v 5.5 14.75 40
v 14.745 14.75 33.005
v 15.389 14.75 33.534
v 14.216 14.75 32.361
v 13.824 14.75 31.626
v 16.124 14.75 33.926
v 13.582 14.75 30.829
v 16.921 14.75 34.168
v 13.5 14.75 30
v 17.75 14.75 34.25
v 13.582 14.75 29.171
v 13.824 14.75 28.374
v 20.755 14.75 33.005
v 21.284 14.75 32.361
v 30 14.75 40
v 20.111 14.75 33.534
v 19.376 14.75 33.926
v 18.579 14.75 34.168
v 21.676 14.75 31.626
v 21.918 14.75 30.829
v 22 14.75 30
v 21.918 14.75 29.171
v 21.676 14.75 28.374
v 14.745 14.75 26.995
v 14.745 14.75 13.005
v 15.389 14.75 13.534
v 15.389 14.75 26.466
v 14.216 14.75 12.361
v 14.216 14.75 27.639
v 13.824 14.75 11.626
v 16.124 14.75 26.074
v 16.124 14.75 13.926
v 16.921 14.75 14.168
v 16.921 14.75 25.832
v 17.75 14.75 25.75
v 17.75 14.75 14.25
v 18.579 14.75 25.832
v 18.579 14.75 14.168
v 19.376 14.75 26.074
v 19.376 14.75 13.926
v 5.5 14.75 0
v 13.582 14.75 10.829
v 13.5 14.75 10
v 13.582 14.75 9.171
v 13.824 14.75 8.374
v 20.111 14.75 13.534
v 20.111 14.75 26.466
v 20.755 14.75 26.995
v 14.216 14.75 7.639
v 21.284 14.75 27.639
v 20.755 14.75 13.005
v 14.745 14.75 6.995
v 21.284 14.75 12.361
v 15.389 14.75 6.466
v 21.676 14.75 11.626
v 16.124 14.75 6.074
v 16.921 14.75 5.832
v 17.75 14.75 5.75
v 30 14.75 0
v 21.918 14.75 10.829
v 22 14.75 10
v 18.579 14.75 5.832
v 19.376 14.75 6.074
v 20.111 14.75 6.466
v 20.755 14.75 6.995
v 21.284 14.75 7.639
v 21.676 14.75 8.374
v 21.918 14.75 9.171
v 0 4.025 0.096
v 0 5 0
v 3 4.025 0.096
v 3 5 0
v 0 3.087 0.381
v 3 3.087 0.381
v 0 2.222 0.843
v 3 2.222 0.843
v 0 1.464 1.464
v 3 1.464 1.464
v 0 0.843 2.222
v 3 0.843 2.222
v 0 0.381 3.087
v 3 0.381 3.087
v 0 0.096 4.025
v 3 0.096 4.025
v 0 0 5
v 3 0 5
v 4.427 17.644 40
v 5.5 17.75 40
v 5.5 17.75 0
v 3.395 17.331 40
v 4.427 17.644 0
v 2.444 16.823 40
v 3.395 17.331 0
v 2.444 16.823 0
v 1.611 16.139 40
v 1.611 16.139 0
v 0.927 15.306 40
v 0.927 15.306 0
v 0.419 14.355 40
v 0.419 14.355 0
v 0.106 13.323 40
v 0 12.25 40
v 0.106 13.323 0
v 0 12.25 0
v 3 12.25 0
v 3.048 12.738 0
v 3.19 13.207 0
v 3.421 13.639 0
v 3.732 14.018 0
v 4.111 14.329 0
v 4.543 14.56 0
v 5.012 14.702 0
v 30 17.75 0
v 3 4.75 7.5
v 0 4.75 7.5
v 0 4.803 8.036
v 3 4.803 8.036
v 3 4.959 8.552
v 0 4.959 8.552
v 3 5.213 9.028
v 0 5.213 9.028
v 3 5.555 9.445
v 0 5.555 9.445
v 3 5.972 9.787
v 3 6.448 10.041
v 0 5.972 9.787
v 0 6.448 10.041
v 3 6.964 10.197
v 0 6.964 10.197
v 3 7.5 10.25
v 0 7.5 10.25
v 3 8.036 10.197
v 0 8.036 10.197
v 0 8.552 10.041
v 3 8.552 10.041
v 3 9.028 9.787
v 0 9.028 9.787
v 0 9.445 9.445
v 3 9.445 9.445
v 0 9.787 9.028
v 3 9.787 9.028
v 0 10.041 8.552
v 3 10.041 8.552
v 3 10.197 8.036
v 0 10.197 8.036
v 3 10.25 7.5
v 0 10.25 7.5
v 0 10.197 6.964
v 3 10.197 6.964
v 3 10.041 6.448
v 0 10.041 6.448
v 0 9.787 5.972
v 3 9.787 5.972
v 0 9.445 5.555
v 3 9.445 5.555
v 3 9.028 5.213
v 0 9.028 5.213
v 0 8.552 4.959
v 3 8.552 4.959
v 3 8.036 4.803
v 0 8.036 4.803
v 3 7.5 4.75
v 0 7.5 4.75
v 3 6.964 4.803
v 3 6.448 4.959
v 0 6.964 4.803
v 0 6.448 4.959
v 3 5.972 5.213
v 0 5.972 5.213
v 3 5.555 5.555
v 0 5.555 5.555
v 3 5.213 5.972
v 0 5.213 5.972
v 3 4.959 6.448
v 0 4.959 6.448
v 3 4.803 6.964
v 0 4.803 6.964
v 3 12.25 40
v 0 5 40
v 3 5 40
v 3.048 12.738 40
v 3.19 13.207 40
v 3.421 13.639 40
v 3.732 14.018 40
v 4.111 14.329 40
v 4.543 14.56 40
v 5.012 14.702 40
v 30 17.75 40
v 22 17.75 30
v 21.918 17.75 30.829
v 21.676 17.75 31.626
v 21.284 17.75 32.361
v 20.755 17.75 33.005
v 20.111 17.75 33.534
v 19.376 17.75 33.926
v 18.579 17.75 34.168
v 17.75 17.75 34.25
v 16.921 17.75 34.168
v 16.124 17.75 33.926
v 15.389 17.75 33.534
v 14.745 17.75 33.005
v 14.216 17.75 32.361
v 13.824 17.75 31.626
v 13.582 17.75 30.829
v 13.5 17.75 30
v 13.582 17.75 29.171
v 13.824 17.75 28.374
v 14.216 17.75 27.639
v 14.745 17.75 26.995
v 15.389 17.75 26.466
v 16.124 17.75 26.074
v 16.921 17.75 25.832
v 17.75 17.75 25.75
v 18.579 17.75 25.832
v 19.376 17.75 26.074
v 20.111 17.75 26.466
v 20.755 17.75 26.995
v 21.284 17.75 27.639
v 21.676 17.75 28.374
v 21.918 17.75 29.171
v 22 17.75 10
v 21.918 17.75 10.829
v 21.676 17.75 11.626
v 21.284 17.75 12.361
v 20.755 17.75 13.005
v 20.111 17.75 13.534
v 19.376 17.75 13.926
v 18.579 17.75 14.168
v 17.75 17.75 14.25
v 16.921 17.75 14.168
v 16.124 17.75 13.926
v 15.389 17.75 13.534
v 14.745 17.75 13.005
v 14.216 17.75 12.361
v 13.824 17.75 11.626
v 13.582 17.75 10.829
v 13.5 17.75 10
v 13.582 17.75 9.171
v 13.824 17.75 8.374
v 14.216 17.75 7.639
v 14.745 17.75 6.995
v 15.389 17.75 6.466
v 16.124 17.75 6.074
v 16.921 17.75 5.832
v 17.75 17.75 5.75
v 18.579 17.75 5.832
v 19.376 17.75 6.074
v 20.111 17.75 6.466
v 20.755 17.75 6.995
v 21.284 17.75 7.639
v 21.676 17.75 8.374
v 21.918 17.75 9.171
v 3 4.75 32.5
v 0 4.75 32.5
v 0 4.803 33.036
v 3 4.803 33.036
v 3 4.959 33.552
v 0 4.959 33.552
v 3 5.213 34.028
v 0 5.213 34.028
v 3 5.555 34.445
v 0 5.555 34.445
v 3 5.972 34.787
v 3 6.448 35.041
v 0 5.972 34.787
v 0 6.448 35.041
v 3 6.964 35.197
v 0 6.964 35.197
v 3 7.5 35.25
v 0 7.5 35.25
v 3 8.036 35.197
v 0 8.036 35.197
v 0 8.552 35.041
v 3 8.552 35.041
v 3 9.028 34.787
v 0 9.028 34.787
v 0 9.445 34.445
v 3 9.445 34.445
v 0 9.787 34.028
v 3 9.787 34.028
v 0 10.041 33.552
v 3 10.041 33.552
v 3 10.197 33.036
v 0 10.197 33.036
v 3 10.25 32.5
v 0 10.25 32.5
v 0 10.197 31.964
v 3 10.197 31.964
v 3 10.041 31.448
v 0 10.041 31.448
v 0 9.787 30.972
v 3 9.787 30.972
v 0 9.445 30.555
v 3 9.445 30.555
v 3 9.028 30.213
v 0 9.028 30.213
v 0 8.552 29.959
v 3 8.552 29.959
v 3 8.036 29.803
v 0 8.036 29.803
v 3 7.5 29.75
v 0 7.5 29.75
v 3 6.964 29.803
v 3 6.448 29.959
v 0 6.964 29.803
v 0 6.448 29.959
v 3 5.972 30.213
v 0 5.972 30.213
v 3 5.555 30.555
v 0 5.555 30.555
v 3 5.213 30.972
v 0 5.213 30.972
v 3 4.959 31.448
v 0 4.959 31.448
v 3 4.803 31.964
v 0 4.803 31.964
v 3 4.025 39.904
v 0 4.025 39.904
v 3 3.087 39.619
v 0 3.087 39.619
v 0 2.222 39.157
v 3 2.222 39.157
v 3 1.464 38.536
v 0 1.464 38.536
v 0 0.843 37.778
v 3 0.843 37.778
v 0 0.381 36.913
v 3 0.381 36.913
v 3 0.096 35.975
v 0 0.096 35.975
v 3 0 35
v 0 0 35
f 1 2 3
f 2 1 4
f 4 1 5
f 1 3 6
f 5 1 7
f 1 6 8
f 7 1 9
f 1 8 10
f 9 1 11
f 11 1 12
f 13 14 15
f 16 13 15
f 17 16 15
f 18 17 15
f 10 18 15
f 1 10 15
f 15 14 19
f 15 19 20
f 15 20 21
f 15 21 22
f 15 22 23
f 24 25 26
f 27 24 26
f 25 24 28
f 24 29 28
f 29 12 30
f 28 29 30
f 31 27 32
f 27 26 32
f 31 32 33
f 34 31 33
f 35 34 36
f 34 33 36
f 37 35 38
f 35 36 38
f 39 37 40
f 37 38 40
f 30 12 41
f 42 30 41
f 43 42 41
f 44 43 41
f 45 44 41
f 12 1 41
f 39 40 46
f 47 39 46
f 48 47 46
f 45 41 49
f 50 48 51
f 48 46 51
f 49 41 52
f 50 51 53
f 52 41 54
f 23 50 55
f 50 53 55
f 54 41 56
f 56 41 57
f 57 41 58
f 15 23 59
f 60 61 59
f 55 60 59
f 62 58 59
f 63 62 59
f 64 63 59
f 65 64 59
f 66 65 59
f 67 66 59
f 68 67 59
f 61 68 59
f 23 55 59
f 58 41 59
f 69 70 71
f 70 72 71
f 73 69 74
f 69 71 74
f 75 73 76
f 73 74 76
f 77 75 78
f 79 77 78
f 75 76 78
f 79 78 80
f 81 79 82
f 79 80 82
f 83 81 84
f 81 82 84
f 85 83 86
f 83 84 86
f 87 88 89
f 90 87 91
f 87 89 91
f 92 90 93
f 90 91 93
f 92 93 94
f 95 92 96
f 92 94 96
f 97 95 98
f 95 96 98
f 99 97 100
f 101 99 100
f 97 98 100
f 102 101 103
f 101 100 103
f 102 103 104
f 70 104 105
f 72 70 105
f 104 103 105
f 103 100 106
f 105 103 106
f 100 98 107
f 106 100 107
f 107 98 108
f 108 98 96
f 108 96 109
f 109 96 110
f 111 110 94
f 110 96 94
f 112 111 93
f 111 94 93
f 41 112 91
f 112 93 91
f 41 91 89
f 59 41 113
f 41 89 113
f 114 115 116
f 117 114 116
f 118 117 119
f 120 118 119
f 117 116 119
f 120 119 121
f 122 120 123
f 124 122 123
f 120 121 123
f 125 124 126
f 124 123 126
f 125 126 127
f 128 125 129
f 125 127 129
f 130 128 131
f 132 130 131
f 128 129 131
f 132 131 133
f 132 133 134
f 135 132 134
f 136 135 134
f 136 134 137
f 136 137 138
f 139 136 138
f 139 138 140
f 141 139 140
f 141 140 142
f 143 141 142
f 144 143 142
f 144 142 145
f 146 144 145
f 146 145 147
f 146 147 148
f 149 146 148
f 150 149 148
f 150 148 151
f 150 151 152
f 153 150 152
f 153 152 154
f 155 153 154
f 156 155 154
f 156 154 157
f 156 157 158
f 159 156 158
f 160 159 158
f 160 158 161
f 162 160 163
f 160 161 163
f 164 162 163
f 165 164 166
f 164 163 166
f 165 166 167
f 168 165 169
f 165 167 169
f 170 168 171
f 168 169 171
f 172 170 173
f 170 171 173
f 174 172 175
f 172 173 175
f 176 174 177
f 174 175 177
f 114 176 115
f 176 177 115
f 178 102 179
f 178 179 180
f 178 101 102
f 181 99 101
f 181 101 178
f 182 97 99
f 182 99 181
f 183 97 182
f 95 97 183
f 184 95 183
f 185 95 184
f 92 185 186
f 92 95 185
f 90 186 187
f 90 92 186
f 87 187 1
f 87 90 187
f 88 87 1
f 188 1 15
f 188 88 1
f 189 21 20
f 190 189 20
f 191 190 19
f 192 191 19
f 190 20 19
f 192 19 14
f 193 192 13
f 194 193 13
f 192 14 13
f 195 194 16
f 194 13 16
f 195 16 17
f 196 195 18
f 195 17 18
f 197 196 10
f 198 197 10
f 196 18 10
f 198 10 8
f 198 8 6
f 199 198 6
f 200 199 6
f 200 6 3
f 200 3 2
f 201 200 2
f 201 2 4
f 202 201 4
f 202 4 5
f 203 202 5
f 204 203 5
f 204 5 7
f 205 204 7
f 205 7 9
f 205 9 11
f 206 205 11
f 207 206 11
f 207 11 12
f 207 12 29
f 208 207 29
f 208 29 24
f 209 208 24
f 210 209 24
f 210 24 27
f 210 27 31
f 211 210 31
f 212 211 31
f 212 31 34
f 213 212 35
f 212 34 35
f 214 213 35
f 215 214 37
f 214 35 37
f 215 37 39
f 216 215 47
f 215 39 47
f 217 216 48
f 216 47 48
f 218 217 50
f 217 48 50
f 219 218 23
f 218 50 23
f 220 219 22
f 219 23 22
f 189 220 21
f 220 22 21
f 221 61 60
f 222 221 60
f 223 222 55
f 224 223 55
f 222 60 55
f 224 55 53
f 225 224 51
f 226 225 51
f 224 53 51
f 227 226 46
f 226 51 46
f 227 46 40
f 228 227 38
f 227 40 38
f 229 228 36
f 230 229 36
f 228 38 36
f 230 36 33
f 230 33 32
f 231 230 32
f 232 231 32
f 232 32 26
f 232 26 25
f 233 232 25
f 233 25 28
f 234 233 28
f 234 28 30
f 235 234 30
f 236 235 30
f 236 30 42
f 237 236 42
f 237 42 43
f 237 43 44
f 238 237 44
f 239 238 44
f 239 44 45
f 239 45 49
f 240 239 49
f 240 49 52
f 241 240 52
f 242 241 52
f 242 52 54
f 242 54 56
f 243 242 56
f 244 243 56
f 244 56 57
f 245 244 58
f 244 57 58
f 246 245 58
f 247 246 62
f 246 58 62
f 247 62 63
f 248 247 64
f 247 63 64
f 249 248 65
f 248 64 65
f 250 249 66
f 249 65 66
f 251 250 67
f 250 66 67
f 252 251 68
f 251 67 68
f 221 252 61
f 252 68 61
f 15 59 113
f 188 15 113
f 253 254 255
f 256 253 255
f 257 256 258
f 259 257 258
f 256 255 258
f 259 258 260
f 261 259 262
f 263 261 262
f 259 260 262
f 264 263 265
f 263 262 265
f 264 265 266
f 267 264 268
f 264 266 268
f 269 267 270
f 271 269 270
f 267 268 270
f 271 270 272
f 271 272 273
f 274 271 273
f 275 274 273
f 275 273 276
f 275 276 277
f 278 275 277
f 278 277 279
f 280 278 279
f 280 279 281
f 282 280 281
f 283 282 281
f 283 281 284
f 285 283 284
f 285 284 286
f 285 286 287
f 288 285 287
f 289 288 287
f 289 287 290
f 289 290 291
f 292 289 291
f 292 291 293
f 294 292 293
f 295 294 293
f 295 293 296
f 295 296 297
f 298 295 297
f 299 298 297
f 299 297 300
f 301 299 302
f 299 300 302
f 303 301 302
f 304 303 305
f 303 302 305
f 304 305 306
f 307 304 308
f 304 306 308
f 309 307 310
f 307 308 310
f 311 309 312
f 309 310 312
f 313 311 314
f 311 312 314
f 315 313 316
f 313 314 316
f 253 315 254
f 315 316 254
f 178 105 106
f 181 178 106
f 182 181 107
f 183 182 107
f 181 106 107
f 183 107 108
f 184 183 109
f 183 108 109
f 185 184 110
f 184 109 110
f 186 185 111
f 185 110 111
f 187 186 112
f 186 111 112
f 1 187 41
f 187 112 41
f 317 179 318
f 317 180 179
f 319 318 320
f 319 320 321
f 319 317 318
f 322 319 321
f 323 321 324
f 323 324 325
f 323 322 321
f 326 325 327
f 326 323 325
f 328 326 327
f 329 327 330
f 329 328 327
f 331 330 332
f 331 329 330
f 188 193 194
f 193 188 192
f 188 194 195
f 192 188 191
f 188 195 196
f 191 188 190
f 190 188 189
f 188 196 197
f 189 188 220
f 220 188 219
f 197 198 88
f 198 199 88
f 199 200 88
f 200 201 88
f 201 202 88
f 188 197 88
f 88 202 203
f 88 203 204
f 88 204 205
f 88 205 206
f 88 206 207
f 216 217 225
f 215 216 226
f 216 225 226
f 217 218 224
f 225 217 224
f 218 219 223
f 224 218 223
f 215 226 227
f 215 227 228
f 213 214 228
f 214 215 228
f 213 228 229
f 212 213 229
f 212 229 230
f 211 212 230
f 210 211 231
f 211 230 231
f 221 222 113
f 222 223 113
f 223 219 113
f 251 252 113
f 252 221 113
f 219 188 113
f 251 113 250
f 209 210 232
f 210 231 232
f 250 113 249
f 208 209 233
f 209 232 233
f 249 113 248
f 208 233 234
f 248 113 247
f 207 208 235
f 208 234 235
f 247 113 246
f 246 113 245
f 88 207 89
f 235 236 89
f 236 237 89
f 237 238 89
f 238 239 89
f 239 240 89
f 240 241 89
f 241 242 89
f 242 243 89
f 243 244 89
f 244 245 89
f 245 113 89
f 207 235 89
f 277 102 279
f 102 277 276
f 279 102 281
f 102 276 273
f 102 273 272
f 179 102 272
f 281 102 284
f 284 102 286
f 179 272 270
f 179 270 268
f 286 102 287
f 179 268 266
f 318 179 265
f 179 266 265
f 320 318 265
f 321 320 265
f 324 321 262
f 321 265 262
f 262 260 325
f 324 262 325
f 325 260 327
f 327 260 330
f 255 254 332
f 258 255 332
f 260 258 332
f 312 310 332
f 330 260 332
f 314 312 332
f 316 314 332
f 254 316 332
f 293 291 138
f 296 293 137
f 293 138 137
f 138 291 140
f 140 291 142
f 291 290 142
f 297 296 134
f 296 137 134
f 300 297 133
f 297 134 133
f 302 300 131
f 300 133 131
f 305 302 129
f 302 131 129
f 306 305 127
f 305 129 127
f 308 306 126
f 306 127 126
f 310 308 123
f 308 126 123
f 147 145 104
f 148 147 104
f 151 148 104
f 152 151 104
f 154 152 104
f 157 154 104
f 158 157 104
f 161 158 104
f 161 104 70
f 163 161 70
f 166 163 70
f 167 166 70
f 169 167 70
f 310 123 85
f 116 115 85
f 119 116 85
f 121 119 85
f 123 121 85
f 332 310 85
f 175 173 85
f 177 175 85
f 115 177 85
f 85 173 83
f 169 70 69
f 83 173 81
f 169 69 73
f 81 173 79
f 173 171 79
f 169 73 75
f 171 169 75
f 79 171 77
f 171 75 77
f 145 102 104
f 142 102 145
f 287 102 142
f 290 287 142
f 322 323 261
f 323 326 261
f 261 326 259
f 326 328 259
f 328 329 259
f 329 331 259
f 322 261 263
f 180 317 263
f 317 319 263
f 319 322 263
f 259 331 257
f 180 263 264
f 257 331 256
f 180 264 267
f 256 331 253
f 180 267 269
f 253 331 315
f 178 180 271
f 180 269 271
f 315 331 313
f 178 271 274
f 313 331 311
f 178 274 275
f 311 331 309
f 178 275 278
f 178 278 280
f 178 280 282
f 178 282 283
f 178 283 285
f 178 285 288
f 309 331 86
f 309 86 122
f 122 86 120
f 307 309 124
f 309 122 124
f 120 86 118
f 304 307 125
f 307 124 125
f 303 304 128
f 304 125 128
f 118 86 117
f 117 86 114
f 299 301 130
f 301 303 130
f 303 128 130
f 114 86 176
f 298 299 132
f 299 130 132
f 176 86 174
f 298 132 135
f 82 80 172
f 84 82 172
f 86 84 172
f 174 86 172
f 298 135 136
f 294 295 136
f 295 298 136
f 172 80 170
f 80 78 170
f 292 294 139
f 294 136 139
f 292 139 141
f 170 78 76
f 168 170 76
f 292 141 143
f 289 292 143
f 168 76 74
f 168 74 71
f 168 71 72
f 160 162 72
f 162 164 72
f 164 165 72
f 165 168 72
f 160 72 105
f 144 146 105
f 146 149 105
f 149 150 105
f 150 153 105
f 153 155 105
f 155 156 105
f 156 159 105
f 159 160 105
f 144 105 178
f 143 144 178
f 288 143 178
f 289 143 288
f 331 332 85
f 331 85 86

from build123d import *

# Parameters (mm, degrees)
F1_DEPTH = 40
F2_R     = 2.75
F4_DEPTH = 30.001
F3_R     = 4.25
F5_DEPTH = 3.001
F6_R     = 5


with BuildPart() as f1:
    # F0 (on Top) → F1 (new body)
    with BuildSketch(Plane.XY):
        with BuildLine():
            Line((0, 12.25), (0, 0))
            Line((0, 0), (3, 0))
            Line((3, 0), (3, 12.25))
            ThreePointArc((3, 12.25), (3.732233, 14.017767), (5.5, 14.75))
            Line((5.5, 14.75), (30, 14.75))
            Line((30, 14.75), (30, 17.75))
            Line((30, 17.75), (5.5, 17.75))
            ThreePointArc((5.5, 17.75), (1.610913, 16.139087), (0, 12.25))
        make_face()
    extrude(amount=F1_DEPTH)

    # F2 (on face) → F4 (cut, through all)
    with BuildSketch(Plane(origin=(0, 0, 0), x_dir=(0, -1, 0), z_dir=(-1, 0, 0))):
        with Locations((-7.5, 32.499999)):
            Circle(F2_R)
        with Locations((-7.5, 7.499999)):
            Circle(F2_R)
    extrude(amount=-F4_DEPTH, mode=Mode.SUBTRACT)

    # F3 (on face) → F5 (cut, through all)
    with BuildSketch(Plane.XZ.offset(-14.75)):
        with Locations((17.75, 10)):
            Circle(F3_R)
        with Locations((17.75, 30)):
            Circle(F3_R)
    extrude(amount=-F5_DEPTH, mode=Mode.SUBTRACT)

    # F6
    f6_edges = [f1.edges().sort_by_distance(p)[0] for p in [
        (1.5, 0, 40),
        (1.5, 0, 0),
    ]]
    fillet(f6_edges, radius=F6_R)


solid = f1.part
